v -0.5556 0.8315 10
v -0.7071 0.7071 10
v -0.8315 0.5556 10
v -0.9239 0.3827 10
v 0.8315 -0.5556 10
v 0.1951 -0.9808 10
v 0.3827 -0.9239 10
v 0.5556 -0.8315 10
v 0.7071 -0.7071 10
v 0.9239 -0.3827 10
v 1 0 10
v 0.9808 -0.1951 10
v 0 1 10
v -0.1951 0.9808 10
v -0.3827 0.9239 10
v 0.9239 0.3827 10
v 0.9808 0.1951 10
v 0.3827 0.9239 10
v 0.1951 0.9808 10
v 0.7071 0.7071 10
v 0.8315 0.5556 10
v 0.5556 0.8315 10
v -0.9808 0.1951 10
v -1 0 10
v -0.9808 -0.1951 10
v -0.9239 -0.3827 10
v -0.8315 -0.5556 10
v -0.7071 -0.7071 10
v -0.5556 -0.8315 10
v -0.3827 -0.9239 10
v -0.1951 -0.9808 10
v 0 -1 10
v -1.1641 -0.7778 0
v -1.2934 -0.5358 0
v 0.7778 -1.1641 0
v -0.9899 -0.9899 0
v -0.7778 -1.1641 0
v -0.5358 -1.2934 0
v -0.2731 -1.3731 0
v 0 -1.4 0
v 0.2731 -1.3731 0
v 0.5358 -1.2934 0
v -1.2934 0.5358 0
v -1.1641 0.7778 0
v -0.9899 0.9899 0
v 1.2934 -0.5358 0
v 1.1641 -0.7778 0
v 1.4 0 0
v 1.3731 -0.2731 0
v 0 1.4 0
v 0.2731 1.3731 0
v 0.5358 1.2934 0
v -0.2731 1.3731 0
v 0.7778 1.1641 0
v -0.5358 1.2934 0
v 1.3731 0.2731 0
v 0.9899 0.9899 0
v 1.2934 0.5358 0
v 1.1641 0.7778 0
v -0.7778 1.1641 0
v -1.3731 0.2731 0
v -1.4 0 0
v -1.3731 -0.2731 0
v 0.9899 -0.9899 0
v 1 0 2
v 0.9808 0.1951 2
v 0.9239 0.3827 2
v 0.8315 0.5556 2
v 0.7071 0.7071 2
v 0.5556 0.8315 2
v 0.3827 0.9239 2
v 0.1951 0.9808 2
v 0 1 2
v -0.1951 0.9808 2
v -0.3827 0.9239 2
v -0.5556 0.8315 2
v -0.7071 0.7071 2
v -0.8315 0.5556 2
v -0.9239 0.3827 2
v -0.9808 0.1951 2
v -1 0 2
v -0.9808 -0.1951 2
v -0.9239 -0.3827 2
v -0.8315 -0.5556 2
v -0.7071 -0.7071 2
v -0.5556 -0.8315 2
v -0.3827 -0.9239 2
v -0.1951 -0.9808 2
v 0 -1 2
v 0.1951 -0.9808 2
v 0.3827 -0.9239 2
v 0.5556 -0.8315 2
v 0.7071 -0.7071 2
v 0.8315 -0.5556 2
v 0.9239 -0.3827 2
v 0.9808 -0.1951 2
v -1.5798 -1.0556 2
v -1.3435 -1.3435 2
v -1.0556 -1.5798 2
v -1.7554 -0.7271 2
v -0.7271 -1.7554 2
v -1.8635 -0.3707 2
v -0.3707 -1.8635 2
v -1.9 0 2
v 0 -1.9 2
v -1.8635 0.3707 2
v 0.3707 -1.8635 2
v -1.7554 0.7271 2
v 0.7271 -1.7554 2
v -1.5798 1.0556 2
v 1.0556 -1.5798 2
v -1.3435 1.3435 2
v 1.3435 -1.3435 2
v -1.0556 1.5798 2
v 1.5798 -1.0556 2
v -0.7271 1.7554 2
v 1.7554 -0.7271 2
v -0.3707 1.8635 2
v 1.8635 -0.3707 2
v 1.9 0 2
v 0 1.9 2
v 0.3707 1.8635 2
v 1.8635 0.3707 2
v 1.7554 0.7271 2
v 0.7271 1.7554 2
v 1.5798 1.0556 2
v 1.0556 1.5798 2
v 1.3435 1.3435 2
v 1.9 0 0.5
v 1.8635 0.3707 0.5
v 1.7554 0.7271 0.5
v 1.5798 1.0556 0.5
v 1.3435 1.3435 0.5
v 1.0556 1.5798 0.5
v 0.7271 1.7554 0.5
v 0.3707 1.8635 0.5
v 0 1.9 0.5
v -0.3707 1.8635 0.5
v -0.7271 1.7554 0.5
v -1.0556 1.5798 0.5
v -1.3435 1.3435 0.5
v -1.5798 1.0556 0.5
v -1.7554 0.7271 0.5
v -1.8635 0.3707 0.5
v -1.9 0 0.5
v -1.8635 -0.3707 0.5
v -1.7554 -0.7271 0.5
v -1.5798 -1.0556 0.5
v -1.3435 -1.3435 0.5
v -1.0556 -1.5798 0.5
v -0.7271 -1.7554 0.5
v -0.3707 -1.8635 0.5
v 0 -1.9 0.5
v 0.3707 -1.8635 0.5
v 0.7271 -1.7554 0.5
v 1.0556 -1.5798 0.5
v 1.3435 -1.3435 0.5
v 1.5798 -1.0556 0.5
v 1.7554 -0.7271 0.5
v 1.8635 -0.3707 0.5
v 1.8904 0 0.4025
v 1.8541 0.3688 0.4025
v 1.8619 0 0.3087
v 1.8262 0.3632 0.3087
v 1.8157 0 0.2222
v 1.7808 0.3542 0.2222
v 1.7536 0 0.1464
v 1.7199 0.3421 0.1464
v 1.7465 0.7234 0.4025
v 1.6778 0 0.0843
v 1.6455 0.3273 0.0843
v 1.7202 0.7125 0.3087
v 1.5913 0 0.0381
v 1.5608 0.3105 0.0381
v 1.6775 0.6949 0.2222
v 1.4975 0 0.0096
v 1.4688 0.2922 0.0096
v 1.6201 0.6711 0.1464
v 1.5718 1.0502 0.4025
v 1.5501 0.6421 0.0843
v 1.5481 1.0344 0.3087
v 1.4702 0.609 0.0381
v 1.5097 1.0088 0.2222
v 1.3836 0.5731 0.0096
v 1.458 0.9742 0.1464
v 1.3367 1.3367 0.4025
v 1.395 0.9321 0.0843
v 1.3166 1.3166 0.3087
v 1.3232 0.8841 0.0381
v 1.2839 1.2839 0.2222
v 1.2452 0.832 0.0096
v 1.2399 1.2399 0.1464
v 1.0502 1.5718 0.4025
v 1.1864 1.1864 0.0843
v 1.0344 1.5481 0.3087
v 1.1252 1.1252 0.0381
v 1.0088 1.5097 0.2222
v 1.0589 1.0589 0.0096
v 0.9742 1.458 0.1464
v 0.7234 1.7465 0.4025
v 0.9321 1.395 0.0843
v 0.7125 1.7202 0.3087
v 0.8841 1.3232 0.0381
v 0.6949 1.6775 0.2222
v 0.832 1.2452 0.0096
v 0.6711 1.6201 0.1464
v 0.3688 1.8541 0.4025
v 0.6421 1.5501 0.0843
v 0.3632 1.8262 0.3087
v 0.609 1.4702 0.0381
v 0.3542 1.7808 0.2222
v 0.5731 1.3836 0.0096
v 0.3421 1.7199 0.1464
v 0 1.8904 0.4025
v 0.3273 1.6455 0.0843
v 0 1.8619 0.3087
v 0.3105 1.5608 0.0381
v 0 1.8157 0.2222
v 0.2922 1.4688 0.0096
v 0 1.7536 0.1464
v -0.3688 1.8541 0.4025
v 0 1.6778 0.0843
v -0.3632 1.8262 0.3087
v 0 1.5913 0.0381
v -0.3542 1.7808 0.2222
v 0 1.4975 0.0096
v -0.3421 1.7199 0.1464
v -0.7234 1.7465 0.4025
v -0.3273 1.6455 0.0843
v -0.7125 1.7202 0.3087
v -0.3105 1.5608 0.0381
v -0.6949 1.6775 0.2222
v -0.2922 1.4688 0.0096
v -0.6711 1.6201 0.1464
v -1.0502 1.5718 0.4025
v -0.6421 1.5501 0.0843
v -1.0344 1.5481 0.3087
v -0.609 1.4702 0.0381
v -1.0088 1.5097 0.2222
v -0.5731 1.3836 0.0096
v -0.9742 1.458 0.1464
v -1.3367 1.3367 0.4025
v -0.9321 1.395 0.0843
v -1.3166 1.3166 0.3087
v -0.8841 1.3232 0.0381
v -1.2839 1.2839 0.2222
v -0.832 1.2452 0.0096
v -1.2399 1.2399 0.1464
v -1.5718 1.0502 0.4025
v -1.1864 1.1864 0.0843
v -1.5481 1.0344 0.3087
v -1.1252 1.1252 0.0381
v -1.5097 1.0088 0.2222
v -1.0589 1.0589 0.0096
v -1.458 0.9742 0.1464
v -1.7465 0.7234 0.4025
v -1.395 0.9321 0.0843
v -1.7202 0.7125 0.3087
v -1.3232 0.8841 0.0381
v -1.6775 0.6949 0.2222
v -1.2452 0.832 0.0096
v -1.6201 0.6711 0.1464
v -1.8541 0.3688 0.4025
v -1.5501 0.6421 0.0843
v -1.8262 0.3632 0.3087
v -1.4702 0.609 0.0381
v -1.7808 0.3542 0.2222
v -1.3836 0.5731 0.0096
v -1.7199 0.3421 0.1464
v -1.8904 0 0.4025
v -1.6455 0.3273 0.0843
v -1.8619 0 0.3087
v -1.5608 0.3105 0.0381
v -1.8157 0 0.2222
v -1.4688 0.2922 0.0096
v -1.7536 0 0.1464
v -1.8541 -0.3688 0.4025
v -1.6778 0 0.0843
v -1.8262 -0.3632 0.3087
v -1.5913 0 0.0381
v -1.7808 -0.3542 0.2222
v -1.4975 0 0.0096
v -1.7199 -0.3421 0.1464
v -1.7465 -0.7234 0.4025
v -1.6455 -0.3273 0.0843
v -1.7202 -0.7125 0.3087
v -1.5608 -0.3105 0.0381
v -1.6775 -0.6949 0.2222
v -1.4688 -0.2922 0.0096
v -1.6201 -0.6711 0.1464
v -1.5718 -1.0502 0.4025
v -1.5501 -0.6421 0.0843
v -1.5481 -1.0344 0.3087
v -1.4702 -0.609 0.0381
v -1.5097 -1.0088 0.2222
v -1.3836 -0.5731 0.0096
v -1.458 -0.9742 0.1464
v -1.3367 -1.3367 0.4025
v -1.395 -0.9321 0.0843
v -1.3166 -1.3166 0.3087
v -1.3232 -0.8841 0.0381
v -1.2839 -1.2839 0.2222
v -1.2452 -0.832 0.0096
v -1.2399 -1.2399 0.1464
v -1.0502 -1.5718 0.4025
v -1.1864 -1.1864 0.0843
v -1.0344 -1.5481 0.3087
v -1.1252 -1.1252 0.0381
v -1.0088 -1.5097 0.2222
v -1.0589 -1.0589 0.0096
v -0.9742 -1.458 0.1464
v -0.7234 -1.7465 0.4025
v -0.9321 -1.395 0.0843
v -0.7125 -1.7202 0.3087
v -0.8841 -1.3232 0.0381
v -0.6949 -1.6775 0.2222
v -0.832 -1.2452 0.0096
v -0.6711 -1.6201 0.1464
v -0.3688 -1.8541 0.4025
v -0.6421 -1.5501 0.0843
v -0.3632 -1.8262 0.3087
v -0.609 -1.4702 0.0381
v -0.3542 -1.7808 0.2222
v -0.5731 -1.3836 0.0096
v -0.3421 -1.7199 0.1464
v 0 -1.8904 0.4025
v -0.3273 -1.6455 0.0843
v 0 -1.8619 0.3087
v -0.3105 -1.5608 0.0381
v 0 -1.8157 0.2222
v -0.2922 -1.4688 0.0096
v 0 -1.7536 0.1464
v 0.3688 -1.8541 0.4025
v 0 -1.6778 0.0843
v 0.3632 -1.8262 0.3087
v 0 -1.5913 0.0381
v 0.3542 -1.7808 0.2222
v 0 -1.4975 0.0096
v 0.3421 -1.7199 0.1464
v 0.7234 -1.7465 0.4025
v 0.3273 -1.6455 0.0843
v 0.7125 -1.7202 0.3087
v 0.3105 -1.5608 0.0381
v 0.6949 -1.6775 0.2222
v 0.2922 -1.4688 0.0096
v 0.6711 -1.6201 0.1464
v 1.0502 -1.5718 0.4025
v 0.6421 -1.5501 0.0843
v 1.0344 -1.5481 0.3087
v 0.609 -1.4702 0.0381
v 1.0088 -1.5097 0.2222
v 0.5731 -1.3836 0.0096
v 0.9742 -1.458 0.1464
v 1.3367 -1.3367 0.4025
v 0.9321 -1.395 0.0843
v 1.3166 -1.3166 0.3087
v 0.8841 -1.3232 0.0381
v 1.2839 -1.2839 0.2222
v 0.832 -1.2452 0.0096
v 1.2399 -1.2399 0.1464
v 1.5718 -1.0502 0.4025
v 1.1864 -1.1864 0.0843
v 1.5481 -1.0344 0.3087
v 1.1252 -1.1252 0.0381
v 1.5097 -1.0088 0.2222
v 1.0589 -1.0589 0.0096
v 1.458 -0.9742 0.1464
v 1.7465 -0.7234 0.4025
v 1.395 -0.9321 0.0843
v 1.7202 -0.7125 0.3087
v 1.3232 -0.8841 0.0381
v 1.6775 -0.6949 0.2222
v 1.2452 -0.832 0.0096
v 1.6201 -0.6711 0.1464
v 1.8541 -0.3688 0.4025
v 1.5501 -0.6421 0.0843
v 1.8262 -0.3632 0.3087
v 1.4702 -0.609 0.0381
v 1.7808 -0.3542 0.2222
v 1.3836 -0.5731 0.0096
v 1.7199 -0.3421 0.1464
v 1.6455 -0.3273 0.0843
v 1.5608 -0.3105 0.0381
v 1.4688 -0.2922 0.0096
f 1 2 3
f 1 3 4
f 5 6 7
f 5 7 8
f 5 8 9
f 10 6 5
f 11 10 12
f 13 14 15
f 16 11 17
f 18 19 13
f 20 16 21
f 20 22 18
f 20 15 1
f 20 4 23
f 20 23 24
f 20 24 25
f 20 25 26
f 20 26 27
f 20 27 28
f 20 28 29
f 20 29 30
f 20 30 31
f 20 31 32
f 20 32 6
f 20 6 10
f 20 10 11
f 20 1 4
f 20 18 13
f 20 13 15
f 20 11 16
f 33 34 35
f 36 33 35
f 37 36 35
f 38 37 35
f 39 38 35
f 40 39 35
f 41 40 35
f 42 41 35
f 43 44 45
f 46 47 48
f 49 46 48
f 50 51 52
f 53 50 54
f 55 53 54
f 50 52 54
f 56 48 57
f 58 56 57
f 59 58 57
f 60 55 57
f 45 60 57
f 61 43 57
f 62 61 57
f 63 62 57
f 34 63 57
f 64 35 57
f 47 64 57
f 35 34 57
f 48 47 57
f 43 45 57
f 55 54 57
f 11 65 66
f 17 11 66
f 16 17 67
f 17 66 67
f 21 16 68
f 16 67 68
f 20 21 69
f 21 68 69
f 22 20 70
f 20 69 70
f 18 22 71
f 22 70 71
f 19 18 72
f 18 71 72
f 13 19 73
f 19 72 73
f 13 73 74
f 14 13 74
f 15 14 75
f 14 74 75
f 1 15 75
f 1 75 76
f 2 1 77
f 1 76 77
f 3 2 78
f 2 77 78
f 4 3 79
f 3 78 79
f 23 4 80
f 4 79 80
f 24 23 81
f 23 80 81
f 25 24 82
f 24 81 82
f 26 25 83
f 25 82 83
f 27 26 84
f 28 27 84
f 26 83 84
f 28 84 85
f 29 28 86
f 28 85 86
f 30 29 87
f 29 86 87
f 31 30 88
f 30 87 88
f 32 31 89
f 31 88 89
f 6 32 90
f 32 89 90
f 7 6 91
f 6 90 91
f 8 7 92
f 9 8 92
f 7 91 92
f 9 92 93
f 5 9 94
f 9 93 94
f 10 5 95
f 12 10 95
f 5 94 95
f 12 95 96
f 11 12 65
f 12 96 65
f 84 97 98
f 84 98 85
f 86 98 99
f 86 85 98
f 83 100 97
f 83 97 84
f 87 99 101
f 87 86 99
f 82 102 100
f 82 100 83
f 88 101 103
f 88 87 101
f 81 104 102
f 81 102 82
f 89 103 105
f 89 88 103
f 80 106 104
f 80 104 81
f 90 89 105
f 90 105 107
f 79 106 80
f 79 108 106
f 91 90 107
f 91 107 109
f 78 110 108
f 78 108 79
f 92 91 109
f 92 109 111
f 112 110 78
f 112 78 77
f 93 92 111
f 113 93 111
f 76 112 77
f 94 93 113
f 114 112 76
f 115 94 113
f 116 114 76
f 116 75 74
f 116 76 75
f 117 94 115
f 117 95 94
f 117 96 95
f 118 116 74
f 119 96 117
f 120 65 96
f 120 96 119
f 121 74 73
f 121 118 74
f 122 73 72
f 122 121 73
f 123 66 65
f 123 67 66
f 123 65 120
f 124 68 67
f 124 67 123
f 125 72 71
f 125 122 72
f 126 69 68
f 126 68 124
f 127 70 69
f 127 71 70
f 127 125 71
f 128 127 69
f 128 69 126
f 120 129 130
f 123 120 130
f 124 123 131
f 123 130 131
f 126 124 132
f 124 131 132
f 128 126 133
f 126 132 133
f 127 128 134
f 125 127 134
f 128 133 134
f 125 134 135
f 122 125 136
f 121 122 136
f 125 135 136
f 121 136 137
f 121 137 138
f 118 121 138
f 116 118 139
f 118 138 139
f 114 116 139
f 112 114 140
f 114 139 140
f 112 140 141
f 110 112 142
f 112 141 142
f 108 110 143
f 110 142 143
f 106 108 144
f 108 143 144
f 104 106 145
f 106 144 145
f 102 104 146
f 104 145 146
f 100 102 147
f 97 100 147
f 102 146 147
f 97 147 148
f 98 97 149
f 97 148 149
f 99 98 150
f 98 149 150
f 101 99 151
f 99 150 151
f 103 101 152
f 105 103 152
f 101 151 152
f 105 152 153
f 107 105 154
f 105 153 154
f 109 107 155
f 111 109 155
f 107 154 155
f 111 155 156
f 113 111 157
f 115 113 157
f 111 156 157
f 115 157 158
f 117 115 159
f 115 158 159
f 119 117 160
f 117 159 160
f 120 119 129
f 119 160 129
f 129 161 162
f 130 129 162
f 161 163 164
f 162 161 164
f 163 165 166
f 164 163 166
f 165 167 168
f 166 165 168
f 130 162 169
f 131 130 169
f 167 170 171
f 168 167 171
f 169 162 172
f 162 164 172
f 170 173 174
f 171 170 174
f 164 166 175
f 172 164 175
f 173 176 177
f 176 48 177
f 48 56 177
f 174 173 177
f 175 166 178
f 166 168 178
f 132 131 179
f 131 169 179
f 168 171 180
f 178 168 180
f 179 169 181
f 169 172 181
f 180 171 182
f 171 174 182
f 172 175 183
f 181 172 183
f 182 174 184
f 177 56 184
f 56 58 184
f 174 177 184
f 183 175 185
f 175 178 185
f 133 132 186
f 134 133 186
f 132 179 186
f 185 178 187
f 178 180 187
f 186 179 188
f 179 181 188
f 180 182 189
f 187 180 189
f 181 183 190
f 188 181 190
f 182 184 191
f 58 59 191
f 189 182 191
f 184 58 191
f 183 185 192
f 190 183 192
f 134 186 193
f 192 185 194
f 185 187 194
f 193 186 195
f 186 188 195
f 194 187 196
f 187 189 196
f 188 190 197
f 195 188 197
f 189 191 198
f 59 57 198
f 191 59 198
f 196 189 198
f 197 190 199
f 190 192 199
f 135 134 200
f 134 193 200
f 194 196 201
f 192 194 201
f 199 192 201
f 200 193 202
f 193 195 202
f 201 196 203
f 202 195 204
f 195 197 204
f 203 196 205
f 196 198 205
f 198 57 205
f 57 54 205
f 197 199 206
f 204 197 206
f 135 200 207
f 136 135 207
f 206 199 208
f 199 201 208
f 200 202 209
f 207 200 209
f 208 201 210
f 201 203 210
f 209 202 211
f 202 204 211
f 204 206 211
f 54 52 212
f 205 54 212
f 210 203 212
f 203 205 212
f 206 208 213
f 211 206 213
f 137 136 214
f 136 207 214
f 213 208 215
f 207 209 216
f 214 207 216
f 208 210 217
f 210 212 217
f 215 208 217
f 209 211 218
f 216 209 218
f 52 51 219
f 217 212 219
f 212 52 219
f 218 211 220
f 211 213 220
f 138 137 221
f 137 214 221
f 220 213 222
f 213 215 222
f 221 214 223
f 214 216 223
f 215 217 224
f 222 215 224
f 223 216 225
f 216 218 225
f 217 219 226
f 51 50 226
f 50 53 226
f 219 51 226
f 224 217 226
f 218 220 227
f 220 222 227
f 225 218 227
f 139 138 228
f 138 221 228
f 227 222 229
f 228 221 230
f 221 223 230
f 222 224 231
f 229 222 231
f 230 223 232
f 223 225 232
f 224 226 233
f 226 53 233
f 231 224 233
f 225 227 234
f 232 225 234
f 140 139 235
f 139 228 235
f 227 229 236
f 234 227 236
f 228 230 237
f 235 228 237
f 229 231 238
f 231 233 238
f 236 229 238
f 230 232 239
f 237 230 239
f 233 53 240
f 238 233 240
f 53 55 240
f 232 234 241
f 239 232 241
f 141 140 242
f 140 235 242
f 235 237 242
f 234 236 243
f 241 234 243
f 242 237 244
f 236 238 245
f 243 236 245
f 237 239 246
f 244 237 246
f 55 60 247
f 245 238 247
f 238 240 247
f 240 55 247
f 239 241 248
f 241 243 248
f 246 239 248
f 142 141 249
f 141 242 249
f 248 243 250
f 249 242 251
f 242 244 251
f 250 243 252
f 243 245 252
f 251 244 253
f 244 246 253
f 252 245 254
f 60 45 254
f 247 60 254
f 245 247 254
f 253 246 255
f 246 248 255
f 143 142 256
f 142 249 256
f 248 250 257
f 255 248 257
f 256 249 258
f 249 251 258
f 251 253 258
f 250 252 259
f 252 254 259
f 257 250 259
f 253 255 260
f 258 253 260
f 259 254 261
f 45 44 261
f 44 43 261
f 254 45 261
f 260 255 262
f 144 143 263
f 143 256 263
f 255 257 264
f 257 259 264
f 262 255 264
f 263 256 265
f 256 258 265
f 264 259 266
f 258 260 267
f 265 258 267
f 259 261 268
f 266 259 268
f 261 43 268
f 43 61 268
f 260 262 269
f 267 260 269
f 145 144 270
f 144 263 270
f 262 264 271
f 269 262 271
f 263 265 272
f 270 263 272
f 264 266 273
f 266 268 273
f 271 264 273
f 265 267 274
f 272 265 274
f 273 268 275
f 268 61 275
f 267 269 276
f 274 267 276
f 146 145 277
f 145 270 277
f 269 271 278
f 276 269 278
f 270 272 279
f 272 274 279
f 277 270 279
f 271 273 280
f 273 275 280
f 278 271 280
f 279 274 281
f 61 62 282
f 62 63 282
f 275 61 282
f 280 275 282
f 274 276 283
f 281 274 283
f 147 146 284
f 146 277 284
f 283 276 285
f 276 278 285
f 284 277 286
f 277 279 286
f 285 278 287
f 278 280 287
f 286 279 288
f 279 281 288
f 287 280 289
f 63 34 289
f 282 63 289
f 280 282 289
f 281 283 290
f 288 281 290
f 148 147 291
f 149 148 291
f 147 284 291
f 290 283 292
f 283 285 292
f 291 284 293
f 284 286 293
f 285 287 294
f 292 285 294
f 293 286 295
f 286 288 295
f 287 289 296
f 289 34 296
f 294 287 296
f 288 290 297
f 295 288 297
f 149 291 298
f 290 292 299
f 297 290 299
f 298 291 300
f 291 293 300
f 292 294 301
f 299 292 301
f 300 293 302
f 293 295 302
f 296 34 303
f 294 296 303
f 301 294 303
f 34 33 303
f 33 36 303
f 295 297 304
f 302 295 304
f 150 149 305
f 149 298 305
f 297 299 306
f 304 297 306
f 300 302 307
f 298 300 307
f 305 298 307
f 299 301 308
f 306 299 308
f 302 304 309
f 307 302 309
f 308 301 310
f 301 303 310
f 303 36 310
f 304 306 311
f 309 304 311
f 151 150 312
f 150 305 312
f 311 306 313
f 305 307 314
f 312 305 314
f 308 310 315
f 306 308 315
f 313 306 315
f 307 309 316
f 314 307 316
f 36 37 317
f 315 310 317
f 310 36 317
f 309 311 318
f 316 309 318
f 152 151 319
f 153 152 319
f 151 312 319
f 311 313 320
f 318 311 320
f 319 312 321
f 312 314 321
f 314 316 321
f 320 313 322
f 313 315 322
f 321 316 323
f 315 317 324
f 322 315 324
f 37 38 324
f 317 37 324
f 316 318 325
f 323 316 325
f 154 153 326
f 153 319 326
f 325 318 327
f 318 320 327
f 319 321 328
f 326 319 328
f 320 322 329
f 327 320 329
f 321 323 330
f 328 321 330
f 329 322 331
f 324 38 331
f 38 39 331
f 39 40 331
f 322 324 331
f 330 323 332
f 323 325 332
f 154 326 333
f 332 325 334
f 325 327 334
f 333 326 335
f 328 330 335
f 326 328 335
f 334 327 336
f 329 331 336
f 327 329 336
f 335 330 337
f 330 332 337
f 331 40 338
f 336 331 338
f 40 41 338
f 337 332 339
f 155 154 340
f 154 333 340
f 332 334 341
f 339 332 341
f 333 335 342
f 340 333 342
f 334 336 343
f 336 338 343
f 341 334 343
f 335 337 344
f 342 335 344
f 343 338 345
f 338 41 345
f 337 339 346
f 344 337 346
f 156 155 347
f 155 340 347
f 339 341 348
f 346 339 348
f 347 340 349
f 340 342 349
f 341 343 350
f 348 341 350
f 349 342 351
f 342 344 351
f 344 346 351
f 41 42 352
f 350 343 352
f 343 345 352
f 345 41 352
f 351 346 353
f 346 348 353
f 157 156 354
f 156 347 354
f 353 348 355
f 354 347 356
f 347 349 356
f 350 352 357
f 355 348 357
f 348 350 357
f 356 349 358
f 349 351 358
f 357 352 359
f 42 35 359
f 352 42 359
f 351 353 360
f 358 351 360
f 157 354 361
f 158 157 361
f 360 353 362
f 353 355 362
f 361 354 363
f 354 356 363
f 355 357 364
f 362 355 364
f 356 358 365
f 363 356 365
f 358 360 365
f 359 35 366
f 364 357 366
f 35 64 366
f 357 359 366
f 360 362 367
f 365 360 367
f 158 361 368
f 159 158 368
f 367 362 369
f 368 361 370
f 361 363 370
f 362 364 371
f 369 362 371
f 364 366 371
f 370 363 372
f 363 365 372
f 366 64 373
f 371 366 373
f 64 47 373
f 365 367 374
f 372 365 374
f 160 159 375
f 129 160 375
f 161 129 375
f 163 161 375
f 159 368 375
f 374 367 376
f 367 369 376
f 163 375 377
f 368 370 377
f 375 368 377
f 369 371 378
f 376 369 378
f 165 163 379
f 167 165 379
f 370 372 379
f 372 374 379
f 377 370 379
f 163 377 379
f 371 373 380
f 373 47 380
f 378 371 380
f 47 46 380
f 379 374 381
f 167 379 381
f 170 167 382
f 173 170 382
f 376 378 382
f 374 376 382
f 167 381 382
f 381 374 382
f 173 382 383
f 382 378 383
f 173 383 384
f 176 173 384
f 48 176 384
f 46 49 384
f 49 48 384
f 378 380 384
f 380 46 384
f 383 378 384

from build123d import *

# Parameters (mm, degrees)
SKETCH_2_R      = 1.9
EXTRUDE_1_DEPTH = 2
SKETCH_3_R      = 1
EXTRUDE_2_DEPTH = 8
FILLET_1_R      = 0.5


with BuildPart() as part:
    # ｽｹｯﾁ2 → ﾎﾞｽ - 押し出し1 (new body)
    with BuildSketch(Plane.XY):
        Circle(SKETCH_2_R)
    extrude(amount=EXTRUDE_1_DEPTH)

    # ｽｹｯﾁ3 → ﾎﾞｽ - 押し出し2 (add)
    with BuildSketch(Plane.XY.offset(2)):
        Circle(SKETCH_3_R)
    extrude(amount=EXTRUDE_2_DEPTH)

    # ﾌｨﾚｯﾄ1
    fillet_1_edges = [part.edges().sort_by_distance(p)[0] for p in [
        (-1.9, 0, 0),
    ]]
    fillet(fillet_1_edges, radius=FILLET_1_R)


solid = part.part
